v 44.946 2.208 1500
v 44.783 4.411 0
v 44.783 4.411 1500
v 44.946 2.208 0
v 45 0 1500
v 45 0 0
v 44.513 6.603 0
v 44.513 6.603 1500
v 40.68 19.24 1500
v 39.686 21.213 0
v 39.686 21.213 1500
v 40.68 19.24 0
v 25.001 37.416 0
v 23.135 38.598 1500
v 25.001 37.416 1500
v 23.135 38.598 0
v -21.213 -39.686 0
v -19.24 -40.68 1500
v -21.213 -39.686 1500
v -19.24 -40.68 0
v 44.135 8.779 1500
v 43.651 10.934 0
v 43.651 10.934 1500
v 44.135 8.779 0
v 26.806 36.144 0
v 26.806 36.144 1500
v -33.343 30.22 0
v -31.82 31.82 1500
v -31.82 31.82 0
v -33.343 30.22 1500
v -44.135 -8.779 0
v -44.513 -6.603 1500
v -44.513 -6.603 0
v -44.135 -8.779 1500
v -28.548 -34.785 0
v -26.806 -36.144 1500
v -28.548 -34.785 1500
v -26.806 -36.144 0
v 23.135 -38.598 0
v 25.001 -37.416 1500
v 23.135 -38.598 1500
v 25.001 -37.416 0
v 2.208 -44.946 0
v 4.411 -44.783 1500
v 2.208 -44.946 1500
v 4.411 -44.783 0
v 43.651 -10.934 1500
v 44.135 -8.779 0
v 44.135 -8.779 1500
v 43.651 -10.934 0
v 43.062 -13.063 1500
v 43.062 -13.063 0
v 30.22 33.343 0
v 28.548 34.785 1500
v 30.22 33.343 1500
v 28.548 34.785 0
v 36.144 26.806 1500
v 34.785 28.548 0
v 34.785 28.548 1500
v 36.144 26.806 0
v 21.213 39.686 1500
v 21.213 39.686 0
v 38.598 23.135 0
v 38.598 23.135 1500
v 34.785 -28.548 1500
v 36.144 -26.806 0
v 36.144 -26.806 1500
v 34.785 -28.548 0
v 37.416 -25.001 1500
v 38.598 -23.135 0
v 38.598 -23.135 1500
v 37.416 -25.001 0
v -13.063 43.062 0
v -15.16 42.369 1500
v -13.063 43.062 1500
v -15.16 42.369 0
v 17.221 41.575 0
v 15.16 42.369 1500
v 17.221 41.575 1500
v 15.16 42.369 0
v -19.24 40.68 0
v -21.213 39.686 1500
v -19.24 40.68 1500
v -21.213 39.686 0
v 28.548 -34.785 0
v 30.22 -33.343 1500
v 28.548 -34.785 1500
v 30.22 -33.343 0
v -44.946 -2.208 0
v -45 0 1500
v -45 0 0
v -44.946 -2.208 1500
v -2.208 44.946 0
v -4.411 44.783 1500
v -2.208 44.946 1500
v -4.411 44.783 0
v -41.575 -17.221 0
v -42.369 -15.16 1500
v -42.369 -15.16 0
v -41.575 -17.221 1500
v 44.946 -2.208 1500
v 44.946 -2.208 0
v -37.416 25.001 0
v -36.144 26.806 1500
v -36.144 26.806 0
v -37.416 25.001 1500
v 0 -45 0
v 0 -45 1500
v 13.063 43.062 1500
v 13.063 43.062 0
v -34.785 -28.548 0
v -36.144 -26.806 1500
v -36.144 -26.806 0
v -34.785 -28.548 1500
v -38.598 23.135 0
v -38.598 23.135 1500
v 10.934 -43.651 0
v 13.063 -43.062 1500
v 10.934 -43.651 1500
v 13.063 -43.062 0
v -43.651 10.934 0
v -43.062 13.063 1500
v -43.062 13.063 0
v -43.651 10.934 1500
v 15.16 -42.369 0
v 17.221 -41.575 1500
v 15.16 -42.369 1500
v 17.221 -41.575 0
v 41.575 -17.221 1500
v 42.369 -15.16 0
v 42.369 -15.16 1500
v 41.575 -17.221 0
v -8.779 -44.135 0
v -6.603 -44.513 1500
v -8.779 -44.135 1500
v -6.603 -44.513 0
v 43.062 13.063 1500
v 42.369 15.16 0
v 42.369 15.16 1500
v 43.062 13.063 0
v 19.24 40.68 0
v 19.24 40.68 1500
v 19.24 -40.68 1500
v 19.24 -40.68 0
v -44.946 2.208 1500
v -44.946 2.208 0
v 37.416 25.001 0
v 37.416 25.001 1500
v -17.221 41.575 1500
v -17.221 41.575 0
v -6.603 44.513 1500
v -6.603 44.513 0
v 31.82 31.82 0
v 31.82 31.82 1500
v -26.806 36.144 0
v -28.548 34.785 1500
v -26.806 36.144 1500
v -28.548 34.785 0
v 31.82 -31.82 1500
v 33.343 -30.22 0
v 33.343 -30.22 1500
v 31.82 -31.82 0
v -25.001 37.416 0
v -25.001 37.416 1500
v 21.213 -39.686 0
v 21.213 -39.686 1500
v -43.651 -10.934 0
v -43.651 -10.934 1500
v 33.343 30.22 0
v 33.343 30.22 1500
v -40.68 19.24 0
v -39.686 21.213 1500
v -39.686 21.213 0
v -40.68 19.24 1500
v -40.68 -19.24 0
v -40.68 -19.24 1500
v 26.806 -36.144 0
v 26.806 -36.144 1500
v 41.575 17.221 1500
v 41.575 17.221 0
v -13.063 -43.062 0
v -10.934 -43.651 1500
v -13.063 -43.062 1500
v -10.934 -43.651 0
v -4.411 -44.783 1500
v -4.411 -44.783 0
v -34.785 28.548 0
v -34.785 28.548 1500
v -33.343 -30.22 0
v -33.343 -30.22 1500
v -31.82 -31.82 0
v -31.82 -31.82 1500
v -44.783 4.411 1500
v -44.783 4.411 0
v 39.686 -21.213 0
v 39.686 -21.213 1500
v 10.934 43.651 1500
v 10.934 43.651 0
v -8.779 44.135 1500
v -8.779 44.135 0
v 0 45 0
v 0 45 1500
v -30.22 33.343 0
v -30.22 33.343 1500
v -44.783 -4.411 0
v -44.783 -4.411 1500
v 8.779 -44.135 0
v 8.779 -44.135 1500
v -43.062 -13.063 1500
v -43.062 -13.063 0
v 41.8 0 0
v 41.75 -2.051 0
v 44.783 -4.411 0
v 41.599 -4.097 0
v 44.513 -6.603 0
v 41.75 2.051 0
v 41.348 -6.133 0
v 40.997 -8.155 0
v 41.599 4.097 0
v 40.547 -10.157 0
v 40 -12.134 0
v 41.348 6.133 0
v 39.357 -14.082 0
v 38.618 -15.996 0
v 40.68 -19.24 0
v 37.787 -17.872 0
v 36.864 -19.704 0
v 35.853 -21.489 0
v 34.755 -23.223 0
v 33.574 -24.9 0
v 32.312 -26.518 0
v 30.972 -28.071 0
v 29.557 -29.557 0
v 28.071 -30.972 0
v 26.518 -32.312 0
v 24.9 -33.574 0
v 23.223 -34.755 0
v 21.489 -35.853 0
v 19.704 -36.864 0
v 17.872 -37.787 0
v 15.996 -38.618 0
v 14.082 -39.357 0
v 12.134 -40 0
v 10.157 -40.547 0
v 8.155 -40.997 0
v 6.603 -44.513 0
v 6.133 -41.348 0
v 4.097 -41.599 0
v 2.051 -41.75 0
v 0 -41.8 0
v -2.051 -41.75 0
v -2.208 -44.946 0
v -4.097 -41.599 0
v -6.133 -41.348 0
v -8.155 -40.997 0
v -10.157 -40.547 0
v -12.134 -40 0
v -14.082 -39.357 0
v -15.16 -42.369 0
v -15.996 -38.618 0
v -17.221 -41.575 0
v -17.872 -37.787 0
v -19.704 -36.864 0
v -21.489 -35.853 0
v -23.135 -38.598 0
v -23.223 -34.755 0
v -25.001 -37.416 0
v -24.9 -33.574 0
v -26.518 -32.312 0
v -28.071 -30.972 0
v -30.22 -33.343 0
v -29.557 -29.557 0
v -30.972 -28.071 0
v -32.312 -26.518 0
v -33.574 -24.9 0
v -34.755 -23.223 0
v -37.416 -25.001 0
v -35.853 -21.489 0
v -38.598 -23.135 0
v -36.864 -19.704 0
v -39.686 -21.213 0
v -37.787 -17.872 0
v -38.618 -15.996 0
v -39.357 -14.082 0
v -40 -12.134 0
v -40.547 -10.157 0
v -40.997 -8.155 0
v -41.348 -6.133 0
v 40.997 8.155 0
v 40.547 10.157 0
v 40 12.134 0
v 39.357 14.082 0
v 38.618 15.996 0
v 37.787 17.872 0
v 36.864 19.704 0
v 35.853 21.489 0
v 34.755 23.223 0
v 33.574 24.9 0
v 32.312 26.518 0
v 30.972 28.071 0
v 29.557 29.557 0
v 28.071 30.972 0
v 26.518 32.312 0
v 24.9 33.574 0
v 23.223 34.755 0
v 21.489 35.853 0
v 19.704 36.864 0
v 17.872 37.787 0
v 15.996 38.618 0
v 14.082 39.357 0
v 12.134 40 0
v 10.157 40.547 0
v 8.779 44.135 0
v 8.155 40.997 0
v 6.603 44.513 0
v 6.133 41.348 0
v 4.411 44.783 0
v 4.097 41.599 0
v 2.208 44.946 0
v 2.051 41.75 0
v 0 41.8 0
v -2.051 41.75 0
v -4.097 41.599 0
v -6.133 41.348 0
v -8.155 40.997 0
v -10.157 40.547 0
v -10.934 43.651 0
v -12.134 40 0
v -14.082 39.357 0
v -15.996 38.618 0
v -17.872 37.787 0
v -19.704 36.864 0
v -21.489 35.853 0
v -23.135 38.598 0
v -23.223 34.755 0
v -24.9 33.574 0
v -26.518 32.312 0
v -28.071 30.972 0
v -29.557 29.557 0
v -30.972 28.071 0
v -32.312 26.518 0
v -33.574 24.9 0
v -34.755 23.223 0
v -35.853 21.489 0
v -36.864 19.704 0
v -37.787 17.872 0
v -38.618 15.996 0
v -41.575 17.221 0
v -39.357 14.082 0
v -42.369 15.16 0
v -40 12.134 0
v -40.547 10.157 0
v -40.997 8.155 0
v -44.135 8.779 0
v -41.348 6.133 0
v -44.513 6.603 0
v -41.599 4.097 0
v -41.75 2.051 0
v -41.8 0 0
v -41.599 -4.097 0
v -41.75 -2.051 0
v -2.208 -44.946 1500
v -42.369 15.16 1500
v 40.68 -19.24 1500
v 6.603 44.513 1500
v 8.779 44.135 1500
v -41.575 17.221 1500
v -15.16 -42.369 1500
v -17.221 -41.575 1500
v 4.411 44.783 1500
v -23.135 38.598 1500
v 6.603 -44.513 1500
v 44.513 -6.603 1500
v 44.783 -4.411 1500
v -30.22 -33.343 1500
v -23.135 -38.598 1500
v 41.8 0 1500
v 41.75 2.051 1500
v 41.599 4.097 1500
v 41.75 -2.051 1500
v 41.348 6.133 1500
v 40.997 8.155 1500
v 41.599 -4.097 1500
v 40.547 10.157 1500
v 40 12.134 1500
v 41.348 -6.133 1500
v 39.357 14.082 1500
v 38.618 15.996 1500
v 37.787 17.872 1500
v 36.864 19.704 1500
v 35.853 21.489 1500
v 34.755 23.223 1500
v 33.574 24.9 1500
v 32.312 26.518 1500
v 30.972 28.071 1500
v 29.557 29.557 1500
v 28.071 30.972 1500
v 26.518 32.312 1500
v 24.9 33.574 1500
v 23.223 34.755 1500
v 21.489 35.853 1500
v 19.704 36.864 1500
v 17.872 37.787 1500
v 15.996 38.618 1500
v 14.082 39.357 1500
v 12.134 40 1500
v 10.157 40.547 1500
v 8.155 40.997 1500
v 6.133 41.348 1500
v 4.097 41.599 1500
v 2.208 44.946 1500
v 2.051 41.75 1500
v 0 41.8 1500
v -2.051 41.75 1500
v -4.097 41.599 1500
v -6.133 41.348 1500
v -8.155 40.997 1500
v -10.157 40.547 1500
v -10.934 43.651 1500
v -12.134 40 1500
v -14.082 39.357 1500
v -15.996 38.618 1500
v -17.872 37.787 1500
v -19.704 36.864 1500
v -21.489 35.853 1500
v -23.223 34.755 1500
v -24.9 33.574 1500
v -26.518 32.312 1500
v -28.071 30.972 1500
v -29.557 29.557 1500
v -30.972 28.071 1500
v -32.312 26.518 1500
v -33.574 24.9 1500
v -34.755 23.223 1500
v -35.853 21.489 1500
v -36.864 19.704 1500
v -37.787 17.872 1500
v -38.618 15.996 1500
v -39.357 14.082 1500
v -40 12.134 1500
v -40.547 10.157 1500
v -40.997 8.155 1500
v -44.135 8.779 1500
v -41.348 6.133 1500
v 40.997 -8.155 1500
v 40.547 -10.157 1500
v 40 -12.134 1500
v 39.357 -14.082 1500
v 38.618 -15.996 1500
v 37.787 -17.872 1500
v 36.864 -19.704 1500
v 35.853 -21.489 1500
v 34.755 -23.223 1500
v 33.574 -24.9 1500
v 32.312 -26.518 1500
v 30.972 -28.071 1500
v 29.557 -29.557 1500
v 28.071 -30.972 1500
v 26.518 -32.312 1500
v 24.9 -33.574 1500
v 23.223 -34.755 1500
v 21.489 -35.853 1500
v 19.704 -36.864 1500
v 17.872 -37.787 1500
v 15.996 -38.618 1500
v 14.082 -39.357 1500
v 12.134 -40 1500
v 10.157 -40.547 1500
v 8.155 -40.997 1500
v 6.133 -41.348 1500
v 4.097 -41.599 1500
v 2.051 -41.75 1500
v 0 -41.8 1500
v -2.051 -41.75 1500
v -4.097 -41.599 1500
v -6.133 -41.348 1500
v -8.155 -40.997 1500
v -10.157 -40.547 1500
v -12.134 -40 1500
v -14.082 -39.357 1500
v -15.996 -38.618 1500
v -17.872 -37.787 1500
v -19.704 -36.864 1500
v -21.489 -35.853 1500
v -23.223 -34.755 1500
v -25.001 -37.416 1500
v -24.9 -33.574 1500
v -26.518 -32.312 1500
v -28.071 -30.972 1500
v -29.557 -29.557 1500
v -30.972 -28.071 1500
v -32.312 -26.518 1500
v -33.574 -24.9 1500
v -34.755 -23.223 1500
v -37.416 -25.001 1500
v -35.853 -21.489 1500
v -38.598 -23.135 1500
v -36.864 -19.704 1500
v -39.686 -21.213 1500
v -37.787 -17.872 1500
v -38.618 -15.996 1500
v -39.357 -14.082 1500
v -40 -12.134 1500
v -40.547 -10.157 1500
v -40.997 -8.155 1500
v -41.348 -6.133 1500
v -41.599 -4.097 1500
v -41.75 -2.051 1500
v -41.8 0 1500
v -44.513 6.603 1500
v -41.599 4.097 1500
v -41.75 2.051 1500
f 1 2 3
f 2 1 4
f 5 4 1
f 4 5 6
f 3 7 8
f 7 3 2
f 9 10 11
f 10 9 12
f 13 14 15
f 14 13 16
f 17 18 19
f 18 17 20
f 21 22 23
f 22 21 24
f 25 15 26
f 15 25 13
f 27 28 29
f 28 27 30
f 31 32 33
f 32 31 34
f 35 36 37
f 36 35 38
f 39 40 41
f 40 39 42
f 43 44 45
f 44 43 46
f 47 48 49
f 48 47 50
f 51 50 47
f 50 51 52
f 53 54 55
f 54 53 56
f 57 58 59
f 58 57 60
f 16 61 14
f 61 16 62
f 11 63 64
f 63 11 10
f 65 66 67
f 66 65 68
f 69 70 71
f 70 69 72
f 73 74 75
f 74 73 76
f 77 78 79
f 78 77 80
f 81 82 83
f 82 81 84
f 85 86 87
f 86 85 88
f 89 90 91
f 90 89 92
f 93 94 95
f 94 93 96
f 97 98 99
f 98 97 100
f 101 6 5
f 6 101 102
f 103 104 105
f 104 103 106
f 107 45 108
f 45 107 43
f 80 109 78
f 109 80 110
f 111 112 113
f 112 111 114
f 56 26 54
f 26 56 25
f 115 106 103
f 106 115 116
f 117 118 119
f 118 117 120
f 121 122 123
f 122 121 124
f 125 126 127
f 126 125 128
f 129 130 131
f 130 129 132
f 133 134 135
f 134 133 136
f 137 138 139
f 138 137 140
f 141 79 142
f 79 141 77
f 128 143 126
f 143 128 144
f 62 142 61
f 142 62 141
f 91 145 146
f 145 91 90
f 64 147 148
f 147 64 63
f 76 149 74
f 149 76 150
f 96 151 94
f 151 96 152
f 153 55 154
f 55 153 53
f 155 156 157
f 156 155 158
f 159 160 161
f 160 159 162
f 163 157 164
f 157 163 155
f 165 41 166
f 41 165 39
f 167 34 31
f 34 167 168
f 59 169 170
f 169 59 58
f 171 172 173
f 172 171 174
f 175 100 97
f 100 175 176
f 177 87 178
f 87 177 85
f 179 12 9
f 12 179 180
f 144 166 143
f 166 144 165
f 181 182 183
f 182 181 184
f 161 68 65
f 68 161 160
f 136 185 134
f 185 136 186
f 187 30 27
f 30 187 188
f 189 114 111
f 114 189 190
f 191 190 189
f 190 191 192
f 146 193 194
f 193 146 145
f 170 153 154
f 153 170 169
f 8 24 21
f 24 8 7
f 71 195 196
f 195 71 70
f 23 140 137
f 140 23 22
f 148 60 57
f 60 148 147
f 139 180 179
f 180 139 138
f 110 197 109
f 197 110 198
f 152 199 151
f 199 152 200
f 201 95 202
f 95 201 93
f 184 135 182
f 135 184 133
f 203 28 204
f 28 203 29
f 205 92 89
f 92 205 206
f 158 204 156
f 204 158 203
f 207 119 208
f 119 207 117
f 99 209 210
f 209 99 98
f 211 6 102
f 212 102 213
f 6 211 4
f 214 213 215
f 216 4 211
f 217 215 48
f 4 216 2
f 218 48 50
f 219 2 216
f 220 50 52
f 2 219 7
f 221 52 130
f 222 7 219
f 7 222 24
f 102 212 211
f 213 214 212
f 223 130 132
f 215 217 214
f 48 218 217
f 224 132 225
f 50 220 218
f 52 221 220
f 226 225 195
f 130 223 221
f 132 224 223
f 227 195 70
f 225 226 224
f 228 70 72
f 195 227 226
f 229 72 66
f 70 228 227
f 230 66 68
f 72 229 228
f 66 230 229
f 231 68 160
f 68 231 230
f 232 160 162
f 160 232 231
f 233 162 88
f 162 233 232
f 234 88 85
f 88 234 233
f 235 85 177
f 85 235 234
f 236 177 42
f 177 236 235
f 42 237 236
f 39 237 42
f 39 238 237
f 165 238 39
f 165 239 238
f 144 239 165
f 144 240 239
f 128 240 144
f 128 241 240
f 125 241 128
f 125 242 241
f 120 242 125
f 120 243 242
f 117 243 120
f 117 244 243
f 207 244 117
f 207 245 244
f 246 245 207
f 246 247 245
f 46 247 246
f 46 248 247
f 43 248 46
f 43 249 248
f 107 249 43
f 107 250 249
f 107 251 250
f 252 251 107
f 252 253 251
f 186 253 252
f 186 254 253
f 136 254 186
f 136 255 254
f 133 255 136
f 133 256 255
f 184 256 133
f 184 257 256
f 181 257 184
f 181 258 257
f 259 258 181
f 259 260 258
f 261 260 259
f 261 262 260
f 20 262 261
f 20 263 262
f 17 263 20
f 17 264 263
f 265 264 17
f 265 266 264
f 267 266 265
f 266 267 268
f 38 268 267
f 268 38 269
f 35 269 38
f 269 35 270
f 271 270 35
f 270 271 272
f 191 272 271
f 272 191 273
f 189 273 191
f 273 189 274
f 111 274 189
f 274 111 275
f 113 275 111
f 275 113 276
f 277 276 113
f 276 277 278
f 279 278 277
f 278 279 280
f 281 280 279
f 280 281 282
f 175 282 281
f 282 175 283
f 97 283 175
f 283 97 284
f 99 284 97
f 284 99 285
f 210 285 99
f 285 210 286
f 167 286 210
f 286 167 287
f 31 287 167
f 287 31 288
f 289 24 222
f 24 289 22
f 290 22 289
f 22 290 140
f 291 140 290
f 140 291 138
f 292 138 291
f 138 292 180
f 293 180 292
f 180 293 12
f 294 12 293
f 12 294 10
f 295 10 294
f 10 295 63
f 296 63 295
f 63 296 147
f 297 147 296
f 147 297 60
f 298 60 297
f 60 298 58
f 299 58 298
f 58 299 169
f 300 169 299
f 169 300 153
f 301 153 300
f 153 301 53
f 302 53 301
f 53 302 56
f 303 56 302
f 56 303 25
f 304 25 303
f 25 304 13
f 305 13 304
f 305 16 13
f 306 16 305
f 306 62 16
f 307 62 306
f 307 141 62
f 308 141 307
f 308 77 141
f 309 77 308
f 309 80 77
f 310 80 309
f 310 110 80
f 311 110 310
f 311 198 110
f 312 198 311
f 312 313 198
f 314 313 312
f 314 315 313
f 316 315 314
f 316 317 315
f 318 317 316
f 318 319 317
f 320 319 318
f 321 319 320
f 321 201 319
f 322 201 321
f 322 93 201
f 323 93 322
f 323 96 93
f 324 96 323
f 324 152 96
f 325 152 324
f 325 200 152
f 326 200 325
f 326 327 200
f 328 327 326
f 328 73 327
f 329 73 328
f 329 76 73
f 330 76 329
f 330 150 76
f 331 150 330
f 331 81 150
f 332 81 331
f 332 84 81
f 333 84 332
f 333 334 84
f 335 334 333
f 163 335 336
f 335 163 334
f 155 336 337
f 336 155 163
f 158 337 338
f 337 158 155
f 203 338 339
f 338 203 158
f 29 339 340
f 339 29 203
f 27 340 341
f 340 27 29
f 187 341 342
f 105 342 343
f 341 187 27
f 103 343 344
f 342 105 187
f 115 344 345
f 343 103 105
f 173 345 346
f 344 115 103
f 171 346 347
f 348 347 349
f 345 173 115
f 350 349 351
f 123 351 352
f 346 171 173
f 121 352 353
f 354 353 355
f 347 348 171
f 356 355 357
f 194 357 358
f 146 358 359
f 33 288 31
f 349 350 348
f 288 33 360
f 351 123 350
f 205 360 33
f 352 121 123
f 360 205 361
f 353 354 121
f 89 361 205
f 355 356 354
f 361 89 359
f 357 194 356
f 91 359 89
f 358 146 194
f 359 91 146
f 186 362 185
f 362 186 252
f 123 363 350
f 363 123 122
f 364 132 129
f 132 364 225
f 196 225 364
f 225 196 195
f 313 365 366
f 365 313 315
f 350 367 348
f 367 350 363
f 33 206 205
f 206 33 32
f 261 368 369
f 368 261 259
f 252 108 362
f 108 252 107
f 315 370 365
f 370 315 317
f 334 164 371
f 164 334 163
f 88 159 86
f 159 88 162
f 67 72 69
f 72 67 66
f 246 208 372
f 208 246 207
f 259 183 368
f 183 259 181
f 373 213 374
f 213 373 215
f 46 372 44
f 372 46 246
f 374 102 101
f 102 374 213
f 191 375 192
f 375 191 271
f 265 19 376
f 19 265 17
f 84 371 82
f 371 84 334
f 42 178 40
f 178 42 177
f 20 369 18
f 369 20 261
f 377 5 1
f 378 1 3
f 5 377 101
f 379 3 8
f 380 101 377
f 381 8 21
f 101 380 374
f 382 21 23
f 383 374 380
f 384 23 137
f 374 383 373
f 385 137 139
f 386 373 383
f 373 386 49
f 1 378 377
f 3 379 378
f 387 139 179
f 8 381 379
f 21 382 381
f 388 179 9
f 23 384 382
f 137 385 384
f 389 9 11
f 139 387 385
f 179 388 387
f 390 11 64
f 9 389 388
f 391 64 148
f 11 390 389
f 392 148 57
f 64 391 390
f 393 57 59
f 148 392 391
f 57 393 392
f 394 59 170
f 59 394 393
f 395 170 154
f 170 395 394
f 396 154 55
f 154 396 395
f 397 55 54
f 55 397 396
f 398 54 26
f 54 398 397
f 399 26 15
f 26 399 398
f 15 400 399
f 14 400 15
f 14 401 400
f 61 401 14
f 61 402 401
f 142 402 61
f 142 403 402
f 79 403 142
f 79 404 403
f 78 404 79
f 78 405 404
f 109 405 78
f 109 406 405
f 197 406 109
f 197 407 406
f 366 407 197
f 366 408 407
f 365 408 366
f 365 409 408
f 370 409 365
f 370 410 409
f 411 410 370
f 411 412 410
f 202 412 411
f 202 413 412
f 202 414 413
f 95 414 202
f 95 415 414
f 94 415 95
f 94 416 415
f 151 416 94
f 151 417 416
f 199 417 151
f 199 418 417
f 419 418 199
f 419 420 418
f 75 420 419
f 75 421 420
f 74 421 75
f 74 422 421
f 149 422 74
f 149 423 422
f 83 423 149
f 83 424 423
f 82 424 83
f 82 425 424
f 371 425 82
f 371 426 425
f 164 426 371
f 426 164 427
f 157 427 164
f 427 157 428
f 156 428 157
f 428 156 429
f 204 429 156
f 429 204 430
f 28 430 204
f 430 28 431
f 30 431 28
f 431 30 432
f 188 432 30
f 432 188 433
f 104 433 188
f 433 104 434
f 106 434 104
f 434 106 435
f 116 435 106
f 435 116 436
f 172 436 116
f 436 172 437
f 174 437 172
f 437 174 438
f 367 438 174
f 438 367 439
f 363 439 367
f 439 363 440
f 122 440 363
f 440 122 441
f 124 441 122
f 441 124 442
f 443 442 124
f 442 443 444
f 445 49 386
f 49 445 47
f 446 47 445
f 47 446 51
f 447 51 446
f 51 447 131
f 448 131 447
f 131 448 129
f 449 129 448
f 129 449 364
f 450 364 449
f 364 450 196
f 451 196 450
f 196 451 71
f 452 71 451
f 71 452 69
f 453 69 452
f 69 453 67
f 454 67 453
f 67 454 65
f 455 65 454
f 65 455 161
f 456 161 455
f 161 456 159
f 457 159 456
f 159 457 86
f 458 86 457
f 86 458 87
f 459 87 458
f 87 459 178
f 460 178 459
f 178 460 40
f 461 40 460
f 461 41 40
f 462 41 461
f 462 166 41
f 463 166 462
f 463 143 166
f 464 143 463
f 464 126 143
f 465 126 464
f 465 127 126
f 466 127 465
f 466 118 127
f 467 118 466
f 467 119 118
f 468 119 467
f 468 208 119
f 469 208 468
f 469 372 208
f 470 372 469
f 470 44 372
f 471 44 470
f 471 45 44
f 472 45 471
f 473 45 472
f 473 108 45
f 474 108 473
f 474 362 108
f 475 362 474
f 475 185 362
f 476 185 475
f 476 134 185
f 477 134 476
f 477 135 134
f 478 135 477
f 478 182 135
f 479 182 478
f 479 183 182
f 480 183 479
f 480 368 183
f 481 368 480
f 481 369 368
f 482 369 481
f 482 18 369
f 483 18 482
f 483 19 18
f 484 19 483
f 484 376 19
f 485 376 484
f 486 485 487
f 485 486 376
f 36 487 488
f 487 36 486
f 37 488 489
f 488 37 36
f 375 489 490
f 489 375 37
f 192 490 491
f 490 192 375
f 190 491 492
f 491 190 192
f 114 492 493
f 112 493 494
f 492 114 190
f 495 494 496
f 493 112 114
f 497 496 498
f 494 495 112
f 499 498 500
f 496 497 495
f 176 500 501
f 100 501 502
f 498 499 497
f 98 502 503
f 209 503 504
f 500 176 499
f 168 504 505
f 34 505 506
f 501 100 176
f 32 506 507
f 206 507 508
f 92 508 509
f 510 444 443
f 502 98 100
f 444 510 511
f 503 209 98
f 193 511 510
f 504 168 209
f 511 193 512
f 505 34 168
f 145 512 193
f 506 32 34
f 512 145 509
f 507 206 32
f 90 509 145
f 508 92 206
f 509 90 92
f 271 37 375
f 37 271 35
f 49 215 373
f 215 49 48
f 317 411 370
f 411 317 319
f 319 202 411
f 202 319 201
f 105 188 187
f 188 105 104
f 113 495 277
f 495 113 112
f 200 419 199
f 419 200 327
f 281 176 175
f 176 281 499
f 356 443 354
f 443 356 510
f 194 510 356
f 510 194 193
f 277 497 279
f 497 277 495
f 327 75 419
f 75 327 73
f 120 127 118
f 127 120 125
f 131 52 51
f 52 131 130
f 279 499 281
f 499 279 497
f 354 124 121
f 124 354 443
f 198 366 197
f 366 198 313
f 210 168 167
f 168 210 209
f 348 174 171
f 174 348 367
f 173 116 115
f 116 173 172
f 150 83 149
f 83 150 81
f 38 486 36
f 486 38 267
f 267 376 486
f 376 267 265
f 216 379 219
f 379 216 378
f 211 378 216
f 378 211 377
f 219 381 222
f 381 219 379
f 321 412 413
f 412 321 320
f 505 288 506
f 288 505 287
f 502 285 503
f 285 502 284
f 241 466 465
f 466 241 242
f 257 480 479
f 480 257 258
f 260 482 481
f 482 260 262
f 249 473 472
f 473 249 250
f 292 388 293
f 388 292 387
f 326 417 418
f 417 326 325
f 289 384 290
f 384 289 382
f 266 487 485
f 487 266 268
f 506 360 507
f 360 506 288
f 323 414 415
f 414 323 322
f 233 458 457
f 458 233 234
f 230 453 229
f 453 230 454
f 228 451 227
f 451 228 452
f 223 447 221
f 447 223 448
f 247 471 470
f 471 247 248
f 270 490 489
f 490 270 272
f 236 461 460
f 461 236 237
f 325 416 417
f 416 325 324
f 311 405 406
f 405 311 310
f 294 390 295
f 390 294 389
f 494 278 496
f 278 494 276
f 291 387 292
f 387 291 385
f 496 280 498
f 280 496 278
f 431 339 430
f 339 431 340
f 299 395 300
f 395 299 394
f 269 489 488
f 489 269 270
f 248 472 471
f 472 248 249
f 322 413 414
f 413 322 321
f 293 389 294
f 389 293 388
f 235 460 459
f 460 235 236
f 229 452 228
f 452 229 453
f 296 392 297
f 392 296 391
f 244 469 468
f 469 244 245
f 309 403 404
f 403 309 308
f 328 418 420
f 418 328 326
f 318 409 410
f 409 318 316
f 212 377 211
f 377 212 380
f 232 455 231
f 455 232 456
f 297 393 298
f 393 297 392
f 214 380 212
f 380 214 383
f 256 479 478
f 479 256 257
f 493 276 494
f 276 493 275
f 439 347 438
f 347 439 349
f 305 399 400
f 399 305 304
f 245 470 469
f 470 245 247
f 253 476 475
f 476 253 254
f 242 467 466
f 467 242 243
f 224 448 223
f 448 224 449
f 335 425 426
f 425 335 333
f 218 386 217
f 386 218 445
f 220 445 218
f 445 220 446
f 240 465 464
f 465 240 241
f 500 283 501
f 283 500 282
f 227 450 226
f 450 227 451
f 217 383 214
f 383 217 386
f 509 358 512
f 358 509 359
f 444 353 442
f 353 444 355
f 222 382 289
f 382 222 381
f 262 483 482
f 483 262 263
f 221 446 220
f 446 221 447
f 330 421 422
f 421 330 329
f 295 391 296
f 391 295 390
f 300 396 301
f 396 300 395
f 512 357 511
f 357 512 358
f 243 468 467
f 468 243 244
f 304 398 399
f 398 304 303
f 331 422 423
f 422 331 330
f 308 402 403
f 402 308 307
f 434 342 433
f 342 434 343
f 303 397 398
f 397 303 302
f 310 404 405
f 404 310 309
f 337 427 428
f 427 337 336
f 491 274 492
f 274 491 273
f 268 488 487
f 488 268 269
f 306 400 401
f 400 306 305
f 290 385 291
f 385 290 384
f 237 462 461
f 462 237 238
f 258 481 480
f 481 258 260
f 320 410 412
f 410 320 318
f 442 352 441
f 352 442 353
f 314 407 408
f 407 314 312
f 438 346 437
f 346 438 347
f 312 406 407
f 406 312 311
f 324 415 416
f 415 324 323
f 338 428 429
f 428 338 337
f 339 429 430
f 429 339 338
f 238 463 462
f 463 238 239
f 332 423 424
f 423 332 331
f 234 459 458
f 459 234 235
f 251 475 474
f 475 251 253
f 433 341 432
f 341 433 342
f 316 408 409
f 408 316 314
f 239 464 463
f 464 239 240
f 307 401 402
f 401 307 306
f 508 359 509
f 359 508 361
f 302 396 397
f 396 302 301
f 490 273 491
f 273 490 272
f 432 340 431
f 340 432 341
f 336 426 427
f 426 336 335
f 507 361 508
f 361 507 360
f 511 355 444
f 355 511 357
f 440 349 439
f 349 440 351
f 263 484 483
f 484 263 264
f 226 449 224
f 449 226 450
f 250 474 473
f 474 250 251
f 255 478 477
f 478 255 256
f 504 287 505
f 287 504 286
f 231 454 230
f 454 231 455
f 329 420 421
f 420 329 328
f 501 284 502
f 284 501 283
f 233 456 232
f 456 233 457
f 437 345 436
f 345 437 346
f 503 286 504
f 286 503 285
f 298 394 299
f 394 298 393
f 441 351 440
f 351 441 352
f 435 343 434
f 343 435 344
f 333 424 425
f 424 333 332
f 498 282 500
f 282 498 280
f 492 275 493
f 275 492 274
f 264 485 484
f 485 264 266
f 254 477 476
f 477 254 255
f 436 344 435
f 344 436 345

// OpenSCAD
$fn = 128;

// HT 90 pipe, length 1500 mm (approx. DN90: OD 90 mm, wall 3.2 mm)
pipe_length = 1500;
outer_d = 90;
wall = 3.2;
inner_d = outer_d - 2*wall;

module ht_pipe(len, od, id) {
    difference() {
        cylinder(h = len, d = od, center = false);
        translate([0,0,-0.5])
            cylinder(h = len + 1, d = id, center = false);
    }
}

ht_pipe(pipe_length, outer_d, inner_d);
